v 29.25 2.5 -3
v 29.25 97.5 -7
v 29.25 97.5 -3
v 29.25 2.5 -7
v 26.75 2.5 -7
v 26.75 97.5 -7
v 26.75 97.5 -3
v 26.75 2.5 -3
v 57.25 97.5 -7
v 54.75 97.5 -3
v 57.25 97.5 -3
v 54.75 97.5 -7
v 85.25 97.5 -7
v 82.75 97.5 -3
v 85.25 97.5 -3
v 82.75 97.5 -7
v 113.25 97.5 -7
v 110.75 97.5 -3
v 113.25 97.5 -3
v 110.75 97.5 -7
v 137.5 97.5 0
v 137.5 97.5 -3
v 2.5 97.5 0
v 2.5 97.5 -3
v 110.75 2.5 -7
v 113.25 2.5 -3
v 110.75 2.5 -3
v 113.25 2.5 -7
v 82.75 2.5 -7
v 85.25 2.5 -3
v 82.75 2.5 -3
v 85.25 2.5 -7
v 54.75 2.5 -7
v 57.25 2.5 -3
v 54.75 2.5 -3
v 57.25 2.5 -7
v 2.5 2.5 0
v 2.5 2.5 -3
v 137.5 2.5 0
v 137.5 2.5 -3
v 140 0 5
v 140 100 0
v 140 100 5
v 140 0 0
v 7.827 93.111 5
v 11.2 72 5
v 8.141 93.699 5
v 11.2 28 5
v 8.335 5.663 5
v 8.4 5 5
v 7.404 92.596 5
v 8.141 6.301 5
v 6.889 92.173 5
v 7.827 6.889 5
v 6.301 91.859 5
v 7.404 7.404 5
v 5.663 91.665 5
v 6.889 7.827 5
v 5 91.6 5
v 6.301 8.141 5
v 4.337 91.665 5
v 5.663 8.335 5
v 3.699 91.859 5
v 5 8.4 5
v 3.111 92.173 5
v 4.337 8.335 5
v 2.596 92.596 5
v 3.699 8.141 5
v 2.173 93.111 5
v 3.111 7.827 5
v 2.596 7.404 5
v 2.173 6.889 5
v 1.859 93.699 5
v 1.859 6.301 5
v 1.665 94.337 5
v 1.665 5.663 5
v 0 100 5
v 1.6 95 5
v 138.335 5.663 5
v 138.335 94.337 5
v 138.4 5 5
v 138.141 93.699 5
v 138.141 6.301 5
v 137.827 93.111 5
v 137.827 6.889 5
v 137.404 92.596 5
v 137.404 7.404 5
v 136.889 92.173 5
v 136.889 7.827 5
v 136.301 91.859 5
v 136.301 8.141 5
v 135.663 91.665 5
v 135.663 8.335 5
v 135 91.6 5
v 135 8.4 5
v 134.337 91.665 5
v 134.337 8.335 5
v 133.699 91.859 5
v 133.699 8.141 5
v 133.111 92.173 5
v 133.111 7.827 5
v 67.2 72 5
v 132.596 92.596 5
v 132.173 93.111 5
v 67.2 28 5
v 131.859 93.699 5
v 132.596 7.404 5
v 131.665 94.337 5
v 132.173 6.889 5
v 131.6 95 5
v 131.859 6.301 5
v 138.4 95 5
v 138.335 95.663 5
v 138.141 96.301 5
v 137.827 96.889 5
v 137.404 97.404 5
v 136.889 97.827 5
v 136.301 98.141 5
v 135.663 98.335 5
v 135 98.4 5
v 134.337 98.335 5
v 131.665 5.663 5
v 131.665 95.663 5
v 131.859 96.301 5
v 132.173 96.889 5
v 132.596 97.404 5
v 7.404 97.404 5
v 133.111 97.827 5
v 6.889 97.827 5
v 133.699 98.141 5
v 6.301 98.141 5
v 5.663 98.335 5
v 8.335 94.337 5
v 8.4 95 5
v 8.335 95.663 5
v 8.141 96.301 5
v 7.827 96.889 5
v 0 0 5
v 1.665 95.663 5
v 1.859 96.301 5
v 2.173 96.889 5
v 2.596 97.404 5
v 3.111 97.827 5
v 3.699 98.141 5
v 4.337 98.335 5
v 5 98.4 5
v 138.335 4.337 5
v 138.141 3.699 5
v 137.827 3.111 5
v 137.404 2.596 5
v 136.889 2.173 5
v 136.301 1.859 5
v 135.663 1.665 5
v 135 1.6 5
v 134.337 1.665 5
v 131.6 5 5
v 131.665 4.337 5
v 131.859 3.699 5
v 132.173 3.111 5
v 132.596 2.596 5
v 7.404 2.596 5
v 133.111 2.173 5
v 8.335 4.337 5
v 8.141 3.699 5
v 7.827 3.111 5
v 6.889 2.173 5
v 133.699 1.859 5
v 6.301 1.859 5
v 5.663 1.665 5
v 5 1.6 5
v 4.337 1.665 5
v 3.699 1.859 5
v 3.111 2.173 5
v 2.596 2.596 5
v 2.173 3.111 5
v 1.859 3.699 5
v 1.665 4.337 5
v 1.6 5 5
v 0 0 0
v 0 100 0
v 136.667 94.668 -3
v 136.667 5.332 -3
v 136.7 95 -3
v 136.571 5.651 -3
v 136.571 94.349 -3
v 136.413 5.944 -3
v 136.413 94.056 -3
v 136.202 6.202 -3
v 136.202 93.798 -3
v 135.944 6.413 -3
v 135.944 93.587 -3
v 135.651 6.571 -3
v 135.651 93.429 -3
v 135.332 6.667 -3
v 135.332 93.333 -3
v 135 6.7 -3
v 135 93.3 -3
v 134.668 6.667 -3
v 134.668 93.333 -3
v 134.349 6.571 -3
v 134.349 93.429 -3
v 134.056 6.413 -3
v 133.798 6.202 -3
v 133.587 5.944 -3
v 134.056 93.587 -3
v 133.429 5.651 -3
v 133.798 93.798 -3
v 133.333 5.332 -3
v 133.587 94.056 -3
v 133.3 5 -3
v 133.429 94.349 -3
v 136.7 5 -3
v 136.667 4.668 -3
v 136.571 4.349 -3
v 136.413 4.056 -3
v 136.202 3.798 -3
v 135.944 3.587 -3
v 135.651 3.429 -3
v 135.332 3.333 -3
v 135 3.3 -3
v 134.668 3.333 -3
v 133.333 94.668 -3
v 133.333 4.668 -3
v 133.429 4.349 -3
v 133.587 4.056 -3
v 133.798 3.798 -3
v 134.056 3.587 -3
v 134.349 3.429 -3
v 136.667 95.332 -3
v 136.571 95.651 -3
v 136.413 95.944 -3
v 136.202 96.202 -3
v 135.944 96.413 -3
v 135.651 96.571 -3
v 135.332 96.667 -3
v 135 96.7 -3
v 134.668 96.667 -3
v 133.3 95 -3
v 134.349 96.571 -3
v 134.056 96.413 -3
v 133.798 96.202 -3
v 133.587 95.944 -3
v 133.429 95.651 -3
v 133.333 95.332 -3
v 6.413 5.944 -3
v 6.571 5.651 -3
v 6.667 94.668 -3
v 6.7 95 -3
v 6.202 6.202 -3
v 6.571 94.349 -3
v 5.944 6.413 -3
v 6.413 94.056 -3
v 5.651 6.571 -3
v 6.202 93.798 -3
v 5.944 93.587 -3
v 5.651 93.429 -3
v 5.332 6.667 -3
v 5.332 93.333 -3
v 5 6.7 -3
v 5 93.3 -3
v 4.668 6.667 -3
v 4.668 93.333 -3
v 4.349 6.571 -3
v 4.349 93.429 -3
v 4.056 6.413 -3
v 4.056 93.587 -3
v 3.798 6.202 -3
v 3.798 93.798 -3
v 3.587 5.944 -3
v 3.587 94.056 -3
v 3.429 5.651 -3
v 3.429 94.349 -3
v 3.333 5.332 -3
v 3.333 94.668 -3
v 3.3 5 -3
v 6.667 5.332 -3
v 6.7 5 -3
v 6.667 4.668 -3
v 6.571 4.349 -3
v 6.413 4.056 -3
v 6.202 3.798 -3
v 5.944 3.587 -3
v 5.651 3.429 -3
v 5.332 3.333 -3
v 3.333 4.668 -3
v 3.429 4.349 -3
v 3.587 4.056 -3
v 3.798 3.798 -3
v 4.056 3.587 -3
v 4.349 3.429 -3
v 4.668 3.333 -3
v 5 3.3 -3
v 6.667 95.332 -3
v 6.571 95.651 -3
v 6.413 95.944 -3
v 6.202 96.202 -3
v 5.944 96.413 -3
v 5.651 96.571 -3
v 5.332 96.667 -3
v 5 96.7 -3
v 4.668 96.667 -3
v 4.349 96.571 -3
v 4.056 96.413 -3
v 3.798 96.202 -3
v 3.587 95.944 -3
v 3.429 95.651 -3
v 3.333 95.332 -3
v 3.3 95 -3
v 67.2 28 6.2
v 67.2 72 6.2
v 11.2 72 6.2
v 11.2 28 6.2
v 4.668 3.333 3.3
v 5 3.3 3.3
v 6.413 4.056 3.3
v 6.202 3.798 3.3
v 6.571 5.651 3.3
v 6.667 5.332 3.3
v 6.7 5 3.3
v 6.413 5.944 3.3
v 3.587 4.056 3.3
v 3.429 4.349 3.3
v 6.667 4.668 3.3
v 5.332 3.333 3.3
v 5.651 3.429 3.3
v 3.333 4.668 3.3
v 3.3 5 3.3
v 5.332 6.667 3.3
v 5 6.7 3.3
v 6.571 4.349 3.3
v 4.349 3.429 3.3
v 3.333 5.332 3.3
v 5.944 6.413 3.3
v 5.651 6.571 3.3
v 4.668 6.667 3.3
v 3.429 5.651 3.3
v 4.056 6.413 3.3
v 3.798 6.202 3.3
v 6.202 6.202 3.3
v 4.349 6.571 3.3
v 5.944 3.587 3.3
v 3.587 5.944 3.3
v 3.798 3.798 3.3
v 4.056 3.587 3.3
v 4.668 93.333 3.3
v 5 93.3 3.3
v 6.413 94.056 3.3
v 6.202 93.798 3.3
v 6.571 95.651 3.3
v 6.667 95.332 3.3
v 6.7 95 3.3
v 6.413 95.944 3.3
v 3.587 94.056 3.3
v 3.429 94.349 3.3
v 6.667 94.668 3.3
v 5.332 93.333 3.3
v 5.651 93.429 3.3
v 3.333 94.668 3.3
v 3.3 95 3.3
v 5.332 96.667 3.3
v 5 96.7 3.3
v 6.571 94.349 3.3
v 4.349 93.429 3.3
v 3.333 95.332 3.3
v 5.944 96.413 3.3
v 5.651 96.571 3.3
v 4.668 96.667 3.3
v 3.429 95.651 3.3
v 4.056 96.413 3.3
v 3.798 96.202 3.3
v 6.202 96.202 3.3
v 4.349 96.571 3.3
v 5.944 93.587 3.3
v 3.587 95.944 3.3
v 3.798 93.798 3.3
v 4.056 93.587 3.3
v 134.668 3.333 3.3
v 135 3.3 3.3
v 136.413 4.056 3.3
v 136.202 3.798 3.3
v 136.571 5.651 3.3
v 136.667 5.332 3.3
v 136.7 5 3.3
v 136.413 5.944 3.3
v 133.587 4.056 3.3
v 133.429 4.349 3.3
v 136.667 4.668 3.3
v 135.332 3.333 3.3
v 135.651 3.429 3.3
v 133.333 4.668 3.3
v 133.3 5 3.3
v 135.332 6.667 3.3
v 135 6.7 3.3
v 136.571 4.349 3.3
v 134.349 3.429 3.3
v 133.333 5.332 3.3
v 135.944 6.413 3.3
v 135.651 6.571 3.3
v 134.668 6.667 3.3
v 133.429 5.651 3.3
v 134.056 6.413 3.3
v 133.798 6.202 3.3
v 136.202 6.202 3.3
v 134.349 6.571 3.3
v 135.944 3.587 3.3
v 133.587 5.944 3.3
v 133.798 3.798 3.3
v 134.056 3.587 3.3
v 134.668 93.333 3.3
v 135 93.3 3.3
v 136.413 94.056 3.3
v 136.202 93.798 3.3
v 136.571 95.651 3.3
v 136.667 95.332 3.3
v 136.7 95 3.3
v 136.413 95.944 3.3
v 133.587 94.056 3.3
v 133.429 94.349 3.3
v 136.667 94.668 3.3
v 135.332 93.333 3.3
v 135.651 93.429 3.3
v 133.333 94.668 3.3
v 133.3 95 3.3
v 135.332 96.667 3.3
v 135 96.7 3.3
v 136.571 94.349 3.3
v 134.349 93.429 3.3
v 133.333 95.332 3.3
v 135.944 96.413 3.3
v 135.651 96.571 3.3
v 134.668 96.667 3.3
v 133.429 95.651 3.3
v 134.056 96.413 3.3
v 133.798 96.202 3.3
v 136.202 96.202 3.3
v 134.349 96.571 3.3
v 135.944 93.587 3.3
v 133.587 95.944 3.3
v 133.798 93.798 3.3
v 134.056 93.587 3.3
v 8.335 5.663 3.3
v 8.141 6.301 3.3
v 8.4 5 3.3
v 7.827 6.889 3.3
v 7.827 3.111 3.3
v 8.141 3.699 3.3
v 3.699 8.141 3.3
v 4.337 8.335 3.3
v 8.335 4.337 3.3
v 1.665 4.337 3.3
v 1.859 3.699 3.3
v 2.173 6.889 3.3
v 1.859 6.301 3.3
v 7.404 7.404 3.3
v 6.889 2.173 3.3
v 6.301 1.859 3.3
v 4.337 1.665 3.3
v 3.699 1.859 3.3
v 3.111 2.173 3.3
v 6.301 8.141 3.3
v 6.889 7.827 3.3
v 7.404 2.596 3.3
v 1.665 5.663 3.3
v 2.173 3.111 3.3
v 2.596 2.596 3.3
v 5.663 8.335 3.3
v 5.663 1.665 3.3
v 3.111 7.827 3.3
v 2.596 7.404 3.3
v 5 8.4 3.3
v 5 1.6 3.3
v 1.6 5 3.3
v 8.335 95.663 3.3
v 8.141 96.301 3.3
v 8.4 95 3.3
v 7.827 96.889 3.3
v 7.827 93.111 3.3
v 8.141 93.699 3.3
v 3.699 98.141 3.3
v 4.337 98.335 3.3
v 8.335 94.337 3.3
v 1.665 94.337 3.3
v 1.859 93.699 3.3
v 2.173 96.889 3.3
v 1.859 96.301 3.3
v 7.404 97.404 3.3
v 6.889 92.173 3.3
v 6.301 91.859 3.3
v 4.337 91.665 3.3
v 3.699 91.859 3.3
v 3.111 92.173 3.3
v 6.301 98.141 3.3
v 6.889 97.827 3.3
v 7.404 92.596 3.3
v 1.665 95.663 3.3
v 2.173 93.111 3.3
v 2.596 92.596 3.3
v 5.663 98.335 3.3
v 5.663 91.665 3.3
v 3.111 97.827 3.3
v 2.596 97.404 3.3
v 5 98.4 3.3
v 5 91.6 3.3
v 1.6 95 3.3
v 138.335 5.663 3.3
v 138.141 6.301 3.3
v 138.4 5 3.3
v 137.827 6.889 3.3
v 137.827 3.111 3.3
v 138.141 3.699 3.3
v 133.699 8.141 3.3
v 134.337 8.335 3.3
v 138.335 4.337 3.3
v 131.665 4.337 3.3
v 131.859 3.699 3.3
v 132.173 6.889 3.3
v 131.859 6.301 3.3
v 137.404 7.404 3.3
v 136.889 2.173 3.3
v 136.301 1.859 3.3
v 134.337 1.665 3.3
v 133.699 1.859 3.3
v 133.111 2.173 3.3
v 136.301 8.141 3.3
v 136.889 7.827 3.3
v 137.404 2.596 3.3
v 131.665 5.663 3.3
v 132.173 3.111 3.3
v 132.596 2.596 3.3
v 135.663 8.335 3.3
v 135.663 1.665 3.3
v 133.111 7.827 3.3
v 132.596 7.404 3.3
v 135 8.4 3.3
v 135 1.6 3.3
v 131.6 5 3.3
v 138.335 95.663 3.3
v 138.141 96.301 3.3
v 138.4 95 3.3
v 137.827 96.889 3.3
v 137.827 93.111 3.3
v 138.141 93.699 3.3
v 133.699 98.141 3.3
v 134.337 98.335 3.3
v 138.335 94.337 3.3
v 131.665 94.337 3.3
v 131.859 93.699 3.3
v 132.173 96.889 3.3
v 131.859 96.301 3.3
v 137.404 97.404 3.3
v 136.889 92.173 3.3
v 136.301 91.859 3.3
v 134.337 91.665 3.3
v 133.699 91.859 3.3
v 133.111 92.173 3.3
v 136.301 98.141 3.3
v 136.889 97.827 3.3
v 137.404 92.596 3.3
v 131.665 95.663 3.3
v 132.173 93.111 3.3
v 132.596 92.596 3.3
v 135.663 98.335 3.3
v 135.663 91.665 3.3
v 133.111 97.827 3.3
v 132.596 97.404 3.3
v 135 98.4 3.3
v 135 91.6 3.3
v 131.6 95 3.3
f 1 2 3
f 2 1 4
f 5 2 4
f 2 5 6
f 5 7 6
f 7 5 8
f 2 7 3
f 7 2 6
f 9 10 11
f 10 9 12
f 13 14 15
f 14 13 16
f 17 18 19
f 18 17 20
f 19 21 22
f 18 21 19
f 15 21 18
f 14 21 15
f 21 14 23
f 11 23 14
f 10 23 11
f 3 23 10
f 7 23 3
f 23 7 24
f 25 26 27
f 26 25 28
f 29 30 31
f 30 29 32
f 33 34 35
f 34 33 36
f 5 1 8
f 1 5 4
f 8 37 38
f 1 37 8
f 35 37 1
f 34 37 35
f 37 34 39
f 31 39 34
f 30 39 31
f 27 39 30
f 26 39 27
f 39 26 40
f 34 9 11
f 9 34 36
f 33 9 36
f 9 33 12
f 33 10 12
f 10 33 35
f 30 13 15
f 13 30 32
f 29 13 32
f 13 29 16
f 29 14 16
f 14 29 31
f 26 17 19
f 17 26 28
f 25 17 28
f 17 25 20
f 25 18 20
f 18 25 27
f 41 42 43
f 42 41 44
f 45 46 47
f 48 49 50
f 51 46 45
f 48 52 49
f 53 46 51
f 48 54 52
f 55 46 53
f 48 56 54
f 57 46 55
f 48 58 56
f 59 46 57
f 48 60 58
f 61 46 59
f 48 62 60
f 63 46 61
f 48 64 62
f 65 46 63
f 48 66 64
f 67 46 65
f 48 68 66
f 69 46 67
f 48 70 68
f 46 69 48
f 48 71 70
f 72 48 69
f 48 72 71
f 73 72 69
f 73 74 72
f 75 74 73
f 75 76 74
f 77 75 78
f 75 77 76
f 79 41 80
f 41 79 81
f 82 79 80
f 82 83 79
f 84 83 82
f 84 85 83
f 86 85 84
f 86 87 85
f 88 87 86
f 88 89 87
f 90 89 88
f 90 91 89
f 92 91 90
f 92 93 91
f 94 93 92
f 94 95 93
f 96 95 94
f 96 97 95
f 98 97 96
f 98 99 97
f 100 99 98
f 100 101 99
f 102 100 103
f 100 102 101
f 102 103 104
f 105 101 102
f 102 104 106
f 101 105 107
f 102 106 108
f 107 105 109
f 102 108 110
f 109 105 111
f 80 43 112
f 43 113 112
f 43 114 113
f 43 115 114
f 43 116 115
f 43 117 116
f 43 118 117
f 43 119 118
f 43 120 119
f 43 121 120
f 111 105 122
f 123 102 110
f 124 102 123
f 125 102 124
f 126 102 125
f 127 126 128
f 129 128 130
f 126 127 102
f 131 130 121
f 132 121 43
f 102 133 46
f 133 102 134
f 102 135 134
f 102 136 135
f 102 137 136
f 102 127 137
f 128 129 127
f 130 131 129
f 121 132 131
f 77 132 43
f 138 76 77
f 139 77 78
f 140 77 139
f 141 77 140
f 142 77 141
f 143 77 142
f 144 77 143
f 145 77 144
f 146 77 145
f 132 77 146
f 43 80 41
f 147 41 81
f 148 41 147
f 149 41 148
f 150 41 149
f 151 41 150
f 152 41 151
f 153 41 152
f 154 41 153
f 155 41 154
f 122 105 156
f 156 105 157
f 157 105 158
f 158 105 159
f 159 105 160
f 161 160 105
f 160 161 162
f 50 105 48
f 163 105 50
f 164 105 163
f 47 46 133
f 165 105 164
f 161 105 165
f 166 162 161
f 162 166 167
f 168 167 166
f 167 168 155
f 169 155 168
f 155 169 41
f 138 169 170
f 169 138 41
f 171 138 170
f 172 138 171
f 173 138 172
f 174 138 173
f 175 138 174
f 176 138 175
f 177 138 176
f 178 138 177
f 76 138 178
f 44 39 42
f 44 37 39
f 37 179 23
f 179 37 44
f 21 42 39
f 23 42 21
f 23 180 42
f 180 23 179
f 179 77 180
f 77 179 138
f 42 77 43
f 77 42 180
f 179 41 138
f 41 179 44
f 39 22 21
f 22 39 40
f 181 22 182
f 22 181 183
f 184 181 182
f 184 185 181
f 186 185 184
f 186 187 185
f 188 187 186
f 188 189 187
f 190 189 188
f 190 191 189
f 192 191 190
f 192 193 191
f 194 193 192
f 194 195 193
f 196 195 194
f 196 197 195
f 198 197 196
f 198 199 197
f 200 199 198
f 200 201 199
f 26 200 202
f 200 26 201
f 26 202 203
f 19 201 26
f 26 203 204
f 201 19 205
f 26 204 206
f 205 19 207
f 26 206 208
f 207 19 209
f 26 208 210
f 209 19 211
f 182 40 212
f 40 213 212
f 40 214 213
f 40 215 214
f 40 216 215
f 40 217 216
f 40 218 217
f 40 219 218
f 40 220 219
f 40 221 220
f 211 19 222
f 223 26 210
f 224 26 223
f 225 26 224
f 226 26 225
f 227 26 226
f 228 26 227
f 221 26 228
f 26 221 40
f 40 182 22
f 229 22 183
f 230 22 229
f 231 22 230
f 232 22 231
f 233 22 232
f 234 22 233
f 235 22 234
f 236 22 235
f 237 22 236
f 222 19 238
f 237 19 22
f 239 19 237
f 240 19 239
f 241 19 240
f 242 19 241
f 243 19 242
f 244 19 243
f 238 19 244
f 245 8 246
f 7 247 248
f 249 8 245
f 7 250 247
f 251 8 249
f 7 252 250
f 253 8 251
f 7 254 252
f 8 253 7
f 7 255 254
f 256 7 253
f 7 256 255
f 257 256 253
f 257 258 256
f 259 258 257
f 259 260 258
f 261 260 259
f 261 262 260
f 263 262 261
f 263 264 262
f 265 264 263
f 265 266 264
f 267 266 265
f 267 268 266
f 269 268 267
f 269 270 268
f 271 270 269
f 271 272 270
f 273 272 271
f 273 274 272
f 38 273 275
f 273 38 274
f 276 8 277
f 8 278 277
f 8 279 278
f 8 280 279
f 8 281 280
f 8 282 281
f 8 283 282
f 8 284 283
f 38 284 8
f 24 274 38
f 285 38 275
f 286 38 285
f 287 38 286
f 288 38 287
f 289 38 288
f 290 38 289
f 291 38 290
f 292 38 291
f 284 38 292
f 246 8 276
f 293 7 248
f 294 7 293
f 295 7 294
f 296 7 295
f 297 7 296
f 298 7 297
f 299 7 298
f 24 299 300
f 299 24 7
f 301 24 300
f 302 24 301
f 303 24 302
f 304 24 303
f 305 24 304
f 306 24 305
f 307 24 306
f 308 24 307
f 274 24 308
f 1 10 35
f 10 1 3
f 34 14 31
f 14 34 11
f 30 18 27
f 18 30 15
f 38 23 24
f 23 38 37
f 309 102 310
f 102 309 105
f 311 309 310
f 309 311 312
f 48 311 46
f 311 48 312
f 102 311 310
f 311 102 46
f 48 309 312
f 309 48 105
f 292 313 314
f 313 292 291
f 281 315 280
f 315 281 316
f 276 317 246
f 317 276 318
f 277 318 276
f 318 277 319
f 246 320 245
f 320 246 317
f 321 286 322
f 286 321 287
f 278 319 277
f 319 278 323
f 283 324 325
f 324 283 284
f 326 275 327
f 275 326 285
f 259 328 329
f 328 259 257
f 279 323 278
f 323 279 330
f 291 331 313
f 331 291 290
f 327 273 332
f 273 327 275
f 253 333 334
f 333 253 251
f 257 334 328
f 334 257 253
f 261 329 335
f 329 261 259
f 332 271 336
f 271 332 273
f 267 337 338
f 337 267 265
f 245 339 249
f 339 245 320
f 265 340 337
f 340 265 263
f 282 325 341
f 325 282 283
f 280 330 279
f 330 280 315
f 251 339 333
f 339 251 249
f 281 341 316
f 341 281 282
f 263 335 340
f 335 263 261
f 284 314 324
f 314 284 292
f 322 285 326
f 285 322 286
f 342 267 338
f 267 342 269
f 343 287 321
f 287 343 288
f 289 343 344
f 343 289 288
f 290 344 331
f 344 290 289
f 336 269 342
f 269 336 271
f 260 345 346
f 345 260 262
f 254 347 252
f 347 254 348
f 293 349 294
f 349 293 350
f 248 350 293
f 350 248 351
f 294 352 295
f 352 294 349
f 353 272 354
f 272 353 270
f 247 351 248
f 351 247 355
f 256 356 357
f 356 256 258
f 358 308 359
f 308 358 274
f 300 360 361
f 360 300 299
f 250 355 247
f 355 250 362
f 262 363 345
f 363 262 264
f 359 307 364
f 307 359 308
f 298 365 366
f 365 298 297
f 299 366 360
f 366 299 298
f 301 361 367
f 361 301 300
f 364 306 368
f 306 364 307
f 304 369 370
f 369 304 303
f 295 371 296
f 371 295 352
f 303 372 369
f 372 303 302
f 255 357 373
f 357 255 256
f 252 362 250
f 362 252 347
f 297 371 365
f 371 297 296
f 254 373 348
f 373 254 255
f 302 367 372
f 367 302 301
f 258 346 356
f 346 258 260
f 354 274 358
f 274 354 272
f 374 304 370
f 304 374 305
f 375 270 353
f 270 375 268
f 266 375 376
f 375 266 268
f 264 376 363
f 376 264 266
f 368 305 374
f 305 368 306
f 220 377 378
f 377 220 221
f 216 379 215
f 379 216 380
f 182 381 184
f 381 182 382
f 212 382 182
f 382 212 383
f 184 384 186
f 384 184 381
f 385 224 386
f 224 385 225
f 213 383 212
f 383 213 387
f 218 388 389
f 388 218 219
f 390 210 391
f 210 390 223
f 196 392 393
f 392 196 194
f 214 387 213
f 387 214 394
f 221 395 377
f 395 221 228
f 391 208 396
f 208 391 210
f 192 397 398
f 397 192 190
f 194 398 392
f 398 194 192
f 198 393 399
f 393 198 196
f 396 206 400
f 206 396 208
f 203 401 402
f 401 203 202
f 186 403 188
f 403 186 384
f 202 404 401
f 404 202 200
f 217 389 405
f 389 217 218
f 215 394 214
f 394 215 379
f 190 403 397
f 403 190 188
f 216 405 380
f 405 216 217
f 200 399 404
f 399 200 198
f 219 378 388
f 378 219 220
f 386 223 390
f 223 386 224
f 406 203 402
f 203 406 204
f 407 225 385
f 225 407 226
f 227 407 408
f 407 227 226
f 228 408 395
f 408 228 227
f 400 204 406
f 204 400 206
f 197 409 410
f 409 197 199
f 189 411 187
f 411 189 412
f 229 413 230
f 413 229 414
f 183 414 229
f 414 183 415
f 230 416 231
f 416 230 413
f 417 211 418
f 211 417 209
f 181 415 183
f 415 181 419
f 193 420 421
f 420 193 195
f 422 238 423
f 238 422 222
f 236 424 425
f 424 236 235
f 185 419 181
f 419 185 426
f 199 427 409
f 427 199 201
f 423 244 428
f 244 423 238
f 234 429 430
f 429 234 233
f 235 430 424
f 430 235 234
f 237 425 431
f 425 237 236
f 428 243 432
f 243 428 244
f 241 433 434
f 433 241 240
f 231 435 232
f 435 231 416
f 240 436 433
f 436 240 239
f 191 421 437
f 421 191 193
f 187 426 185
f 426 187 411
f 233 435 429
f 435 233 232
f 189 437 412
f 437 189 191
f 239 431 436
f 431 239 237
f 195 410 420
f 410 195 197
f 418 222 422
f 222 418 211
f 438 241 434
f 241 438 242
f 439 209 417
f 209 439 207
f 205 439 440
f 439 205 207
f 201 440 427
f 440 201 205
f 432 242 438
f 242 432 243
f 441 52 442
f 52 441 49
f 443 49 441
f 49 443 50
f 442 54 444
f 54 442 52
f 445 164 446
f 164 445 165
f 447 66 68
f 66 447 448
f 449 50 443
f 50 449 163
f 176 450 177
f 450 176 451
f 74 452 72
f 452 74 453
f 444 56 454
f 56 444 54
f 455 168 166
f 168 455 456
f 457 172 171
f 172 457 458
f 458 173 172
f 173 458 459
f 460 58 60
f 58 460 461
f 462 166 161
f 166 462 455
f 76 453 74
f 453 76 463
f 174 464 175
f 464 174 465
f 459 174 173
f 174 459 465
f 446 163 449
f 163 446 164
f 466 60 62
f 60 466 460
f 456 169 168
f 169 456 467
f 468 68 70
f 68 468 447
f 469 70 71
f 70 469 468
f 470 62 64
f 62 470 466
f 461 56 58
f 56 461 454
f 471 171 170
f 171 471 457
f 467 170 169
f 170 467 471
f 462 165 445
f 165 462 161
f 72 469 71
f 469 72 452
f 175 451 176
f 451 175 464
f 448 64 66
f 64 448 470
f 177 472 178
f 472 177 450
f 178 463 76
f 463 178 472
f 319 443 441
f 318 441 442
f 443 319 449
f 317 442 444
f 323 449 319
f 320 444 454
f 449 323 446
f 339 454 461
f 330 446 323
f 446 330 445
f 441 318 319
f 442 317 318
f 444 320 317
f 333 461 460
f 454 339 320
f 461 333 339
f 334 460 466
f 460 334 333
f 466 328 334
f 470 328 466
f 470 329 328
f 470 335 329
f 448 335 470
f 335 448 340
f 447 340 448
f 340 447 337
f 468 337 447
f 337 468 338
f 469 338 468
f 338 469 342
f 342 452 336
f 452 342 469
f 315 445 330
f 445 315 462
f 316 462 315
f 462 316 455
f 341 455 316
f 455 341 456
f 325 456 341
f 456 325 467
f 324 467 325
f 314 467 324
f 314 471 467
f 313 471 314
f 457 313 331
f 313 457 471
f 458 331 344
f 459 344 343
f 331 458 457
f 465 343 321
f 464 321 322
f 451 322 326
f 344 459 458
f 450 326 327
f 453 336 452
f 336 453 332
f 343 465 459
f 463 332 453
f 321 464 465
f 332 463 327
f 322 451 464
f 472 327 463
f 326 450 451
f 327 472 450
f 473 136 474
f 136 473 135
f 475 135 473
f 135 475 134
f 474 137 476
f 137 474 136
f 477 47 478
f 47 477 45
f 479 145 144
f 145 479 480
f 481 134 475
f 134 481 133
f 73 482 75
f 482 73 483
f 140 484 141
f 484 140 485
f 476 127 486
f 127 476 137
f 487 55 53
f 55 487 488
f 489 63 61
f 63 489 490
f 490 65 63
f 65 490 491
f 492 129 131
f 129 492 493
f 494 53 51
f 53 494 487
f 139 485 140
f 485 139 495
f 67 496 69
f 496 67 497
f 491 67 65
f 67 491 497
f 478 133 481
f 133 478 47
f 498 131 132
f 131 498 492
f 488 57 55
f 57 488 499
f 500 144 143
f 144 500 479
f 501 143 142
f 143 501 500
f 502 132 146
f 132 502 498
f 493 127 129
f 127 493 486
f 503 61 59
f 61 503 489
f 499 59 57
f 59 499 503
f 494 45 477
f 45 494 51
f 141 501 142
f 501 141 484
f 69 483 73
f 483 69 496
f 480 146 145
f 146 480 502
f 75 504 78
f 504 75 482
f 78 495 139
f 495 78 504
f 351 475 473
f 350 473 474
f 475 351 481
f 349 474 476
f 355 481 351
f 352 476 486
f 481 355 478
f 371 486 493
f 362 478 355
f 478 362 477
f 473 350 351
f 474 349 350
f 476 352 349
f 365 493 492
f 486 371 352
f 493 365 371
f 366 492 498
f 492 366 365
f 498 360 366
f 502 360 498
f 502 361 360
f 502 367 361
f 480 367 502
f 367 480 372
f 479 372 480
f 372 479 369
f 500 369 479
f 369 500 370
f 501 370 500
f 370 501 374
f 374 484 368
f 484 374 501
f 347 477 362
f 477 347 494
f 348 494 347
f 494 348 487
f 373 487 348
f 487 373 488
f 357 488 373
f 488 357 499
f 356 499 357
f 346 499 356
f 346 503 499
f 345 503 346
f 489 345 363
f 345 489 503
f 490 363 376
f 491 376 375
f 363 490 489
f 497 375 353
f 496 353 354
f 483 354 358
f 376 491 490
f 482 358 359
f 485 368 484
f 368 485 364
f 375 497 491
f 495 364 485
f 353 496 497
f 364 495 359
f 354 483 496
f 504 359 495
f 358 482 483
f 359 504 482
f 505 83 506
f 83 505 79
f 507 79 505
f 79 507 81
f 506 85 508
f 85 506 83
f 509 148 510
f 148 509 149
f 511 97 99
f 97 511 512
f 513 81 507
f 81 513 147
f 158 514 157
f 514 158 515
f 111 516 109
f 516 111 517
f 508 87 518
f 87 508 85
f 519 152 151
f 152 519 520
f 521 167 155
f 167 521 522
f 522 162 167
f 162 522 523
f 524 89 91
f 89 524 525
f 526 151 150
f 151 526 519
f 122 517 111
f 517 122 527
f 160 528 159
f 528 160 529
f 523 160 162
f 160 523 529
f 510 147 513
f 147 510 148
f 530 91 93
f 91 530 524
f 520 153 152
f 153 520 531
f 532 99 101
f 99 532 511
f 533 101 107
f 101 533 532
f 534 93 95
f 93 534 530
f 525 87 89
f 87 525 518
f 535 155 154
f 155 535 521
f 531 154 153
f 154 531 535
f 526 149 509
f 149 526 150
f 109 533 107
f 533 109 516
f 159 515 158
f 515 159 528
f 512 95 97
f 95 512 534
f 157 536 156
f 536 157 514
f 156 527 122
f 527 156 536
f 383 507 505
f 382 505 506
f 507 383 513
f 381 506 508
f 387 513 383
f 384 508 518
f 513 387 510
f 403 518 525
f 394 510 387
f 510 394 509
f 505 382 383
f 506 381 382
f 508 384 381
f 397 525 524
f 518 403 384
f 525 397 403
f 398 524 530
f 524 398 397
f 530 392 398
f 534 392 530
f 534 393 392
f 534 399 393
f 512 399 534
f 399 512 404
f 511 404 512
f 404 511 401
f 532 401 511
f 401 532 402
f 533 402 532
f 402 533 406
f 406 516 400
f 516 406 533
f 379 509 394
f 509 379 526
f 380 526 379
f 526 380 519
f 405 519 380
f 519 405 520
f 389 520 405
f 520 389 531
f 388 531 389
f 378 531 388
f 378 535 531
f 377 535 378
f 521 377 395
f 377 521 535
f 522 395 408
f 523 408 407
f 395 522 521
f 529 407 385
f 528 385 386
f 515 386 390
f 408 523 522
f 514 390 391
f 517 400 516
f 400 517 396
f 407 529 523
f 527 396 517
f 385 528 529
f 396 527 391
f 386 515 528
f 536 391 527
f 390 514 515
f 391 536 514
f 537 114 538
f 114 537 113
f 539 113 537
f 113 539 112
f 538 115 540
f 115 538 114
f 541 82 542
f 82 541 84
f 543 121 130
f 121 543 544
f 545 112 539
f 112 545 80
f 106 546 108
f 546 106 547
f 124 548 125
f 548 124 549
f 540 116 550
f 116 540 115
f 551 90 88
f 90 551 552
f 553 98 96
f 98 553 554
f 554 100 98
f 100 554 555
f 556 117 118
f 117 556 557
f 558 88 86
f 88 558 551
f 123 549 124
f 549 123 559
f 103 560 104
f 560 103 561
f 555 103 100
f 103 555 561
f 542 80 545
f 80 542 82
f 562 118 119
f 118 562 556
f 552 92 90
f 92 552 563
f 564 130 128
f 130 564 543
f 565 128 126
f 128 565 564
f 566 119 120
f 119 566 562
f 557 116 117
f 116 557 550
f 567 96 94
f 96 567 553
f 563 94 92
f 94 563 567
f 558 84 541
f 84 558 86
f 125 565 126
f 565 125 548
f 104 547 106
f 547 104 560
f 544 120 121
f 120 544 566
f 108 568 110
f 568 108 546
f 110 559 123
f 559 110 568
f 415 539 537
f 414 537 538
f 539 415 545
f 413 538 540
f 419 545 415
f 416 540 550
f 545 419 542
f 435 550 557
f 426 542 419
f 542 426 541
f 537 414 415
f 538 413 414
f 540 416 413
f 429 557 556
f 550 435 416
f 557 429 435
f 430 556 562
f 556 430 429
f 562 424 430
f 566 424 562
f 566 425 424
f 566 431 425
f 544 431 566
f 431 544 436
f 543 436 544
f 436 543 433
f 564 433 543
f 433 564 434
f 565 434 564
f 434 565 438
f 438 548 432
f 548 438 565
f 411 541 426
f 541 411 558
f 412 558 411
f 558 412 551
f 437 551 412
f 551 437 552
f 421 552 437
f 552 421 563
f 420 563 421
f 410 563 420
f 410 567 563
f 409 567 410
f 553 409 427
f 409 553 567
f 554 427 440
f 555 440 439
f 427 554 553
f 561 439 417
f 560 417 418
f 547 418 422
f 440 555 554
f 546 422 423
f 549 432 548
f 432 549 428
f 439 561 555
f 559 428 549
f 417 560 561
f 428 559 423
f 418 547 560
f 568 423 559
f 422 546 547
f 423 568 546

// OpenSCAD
$fn = 32;

// ----------------------------------------------------------------------
// Enclosure lid: 140 x 100 x 5 mm, 4 bolt holes
// ----------------------------------------------------------------------

// --- parameters (mm) ---
length = 140;             // lid length, X
width = 100;              // lid width, Y
plate_t = 5;              // lid plate thickness
bolt_d = 3.4;             // bolt clearance
boss_lip = 5;             // bolt hole inset from the corner
sink = 1;                 // overlap of the lip and ribs into the plate
lip_h = 4;                // lip height below the plate
lip_wall = 2.5;           // lip wall thickness
cs_d = 6.8;               // countersink diameter
cs_h = 1.7;               // countersink depth
rib_n = 4;                // stiffening ribs
rib_t = 2.5;              // rib thickness
rib_h = 8;                // rib height below the plate
label_h = 1.2;            // raised marking pad

module plate() {
  cube([length, width, plate_t]);
  /* lip that drops into the housing opening, sunk into the plate */
  translate([lip_wall, lip_wall, -lip_h + sink]) cube([length - 2 * lip_wall, width - 2 * lip_wall, lip_h]);
  /* stiffening ribs under the plate */
  for (i = [1 : rib_n]) translate([length * i / (rib_n + 1) - rib_t / 2, lip_wall, -rib_h + sink]) cube([rib_t, width - 2 * lip_wall, rib_h]);
  /* raised marking pad on top, sunk 1 mm into the plate */
  translate([length * 0.08, width * 0.28, plate_t - 1]) cube([length * 0.4, width * 0.44, label_h + 1]);
}

difference() {
  plate();
  /* bolt pattern matching the corner bosses */
  for (sx = [0, 1]) for (sy = [0, 1])
    translate([sx * (length - 2 * boss_lip) + boss_lip, sy * (width - 2 * boss_lip) + boss_lip, -lip_h - 1])
      cylinder(h = plate_t + lip_h + 2, d = bolt_d);
  /* countersinks so the heads sit flush */
  for (sx = [0, 1]) for (sy = [0, 1])
    translate([sx * (length - 2 * boss_lip) + boss_lip, sy * (width - 2 * boss_lip) + boss_lip, plate_t - cs_h])
      cylinder(h = cs_h + 0.5, d = cs_d);
}
